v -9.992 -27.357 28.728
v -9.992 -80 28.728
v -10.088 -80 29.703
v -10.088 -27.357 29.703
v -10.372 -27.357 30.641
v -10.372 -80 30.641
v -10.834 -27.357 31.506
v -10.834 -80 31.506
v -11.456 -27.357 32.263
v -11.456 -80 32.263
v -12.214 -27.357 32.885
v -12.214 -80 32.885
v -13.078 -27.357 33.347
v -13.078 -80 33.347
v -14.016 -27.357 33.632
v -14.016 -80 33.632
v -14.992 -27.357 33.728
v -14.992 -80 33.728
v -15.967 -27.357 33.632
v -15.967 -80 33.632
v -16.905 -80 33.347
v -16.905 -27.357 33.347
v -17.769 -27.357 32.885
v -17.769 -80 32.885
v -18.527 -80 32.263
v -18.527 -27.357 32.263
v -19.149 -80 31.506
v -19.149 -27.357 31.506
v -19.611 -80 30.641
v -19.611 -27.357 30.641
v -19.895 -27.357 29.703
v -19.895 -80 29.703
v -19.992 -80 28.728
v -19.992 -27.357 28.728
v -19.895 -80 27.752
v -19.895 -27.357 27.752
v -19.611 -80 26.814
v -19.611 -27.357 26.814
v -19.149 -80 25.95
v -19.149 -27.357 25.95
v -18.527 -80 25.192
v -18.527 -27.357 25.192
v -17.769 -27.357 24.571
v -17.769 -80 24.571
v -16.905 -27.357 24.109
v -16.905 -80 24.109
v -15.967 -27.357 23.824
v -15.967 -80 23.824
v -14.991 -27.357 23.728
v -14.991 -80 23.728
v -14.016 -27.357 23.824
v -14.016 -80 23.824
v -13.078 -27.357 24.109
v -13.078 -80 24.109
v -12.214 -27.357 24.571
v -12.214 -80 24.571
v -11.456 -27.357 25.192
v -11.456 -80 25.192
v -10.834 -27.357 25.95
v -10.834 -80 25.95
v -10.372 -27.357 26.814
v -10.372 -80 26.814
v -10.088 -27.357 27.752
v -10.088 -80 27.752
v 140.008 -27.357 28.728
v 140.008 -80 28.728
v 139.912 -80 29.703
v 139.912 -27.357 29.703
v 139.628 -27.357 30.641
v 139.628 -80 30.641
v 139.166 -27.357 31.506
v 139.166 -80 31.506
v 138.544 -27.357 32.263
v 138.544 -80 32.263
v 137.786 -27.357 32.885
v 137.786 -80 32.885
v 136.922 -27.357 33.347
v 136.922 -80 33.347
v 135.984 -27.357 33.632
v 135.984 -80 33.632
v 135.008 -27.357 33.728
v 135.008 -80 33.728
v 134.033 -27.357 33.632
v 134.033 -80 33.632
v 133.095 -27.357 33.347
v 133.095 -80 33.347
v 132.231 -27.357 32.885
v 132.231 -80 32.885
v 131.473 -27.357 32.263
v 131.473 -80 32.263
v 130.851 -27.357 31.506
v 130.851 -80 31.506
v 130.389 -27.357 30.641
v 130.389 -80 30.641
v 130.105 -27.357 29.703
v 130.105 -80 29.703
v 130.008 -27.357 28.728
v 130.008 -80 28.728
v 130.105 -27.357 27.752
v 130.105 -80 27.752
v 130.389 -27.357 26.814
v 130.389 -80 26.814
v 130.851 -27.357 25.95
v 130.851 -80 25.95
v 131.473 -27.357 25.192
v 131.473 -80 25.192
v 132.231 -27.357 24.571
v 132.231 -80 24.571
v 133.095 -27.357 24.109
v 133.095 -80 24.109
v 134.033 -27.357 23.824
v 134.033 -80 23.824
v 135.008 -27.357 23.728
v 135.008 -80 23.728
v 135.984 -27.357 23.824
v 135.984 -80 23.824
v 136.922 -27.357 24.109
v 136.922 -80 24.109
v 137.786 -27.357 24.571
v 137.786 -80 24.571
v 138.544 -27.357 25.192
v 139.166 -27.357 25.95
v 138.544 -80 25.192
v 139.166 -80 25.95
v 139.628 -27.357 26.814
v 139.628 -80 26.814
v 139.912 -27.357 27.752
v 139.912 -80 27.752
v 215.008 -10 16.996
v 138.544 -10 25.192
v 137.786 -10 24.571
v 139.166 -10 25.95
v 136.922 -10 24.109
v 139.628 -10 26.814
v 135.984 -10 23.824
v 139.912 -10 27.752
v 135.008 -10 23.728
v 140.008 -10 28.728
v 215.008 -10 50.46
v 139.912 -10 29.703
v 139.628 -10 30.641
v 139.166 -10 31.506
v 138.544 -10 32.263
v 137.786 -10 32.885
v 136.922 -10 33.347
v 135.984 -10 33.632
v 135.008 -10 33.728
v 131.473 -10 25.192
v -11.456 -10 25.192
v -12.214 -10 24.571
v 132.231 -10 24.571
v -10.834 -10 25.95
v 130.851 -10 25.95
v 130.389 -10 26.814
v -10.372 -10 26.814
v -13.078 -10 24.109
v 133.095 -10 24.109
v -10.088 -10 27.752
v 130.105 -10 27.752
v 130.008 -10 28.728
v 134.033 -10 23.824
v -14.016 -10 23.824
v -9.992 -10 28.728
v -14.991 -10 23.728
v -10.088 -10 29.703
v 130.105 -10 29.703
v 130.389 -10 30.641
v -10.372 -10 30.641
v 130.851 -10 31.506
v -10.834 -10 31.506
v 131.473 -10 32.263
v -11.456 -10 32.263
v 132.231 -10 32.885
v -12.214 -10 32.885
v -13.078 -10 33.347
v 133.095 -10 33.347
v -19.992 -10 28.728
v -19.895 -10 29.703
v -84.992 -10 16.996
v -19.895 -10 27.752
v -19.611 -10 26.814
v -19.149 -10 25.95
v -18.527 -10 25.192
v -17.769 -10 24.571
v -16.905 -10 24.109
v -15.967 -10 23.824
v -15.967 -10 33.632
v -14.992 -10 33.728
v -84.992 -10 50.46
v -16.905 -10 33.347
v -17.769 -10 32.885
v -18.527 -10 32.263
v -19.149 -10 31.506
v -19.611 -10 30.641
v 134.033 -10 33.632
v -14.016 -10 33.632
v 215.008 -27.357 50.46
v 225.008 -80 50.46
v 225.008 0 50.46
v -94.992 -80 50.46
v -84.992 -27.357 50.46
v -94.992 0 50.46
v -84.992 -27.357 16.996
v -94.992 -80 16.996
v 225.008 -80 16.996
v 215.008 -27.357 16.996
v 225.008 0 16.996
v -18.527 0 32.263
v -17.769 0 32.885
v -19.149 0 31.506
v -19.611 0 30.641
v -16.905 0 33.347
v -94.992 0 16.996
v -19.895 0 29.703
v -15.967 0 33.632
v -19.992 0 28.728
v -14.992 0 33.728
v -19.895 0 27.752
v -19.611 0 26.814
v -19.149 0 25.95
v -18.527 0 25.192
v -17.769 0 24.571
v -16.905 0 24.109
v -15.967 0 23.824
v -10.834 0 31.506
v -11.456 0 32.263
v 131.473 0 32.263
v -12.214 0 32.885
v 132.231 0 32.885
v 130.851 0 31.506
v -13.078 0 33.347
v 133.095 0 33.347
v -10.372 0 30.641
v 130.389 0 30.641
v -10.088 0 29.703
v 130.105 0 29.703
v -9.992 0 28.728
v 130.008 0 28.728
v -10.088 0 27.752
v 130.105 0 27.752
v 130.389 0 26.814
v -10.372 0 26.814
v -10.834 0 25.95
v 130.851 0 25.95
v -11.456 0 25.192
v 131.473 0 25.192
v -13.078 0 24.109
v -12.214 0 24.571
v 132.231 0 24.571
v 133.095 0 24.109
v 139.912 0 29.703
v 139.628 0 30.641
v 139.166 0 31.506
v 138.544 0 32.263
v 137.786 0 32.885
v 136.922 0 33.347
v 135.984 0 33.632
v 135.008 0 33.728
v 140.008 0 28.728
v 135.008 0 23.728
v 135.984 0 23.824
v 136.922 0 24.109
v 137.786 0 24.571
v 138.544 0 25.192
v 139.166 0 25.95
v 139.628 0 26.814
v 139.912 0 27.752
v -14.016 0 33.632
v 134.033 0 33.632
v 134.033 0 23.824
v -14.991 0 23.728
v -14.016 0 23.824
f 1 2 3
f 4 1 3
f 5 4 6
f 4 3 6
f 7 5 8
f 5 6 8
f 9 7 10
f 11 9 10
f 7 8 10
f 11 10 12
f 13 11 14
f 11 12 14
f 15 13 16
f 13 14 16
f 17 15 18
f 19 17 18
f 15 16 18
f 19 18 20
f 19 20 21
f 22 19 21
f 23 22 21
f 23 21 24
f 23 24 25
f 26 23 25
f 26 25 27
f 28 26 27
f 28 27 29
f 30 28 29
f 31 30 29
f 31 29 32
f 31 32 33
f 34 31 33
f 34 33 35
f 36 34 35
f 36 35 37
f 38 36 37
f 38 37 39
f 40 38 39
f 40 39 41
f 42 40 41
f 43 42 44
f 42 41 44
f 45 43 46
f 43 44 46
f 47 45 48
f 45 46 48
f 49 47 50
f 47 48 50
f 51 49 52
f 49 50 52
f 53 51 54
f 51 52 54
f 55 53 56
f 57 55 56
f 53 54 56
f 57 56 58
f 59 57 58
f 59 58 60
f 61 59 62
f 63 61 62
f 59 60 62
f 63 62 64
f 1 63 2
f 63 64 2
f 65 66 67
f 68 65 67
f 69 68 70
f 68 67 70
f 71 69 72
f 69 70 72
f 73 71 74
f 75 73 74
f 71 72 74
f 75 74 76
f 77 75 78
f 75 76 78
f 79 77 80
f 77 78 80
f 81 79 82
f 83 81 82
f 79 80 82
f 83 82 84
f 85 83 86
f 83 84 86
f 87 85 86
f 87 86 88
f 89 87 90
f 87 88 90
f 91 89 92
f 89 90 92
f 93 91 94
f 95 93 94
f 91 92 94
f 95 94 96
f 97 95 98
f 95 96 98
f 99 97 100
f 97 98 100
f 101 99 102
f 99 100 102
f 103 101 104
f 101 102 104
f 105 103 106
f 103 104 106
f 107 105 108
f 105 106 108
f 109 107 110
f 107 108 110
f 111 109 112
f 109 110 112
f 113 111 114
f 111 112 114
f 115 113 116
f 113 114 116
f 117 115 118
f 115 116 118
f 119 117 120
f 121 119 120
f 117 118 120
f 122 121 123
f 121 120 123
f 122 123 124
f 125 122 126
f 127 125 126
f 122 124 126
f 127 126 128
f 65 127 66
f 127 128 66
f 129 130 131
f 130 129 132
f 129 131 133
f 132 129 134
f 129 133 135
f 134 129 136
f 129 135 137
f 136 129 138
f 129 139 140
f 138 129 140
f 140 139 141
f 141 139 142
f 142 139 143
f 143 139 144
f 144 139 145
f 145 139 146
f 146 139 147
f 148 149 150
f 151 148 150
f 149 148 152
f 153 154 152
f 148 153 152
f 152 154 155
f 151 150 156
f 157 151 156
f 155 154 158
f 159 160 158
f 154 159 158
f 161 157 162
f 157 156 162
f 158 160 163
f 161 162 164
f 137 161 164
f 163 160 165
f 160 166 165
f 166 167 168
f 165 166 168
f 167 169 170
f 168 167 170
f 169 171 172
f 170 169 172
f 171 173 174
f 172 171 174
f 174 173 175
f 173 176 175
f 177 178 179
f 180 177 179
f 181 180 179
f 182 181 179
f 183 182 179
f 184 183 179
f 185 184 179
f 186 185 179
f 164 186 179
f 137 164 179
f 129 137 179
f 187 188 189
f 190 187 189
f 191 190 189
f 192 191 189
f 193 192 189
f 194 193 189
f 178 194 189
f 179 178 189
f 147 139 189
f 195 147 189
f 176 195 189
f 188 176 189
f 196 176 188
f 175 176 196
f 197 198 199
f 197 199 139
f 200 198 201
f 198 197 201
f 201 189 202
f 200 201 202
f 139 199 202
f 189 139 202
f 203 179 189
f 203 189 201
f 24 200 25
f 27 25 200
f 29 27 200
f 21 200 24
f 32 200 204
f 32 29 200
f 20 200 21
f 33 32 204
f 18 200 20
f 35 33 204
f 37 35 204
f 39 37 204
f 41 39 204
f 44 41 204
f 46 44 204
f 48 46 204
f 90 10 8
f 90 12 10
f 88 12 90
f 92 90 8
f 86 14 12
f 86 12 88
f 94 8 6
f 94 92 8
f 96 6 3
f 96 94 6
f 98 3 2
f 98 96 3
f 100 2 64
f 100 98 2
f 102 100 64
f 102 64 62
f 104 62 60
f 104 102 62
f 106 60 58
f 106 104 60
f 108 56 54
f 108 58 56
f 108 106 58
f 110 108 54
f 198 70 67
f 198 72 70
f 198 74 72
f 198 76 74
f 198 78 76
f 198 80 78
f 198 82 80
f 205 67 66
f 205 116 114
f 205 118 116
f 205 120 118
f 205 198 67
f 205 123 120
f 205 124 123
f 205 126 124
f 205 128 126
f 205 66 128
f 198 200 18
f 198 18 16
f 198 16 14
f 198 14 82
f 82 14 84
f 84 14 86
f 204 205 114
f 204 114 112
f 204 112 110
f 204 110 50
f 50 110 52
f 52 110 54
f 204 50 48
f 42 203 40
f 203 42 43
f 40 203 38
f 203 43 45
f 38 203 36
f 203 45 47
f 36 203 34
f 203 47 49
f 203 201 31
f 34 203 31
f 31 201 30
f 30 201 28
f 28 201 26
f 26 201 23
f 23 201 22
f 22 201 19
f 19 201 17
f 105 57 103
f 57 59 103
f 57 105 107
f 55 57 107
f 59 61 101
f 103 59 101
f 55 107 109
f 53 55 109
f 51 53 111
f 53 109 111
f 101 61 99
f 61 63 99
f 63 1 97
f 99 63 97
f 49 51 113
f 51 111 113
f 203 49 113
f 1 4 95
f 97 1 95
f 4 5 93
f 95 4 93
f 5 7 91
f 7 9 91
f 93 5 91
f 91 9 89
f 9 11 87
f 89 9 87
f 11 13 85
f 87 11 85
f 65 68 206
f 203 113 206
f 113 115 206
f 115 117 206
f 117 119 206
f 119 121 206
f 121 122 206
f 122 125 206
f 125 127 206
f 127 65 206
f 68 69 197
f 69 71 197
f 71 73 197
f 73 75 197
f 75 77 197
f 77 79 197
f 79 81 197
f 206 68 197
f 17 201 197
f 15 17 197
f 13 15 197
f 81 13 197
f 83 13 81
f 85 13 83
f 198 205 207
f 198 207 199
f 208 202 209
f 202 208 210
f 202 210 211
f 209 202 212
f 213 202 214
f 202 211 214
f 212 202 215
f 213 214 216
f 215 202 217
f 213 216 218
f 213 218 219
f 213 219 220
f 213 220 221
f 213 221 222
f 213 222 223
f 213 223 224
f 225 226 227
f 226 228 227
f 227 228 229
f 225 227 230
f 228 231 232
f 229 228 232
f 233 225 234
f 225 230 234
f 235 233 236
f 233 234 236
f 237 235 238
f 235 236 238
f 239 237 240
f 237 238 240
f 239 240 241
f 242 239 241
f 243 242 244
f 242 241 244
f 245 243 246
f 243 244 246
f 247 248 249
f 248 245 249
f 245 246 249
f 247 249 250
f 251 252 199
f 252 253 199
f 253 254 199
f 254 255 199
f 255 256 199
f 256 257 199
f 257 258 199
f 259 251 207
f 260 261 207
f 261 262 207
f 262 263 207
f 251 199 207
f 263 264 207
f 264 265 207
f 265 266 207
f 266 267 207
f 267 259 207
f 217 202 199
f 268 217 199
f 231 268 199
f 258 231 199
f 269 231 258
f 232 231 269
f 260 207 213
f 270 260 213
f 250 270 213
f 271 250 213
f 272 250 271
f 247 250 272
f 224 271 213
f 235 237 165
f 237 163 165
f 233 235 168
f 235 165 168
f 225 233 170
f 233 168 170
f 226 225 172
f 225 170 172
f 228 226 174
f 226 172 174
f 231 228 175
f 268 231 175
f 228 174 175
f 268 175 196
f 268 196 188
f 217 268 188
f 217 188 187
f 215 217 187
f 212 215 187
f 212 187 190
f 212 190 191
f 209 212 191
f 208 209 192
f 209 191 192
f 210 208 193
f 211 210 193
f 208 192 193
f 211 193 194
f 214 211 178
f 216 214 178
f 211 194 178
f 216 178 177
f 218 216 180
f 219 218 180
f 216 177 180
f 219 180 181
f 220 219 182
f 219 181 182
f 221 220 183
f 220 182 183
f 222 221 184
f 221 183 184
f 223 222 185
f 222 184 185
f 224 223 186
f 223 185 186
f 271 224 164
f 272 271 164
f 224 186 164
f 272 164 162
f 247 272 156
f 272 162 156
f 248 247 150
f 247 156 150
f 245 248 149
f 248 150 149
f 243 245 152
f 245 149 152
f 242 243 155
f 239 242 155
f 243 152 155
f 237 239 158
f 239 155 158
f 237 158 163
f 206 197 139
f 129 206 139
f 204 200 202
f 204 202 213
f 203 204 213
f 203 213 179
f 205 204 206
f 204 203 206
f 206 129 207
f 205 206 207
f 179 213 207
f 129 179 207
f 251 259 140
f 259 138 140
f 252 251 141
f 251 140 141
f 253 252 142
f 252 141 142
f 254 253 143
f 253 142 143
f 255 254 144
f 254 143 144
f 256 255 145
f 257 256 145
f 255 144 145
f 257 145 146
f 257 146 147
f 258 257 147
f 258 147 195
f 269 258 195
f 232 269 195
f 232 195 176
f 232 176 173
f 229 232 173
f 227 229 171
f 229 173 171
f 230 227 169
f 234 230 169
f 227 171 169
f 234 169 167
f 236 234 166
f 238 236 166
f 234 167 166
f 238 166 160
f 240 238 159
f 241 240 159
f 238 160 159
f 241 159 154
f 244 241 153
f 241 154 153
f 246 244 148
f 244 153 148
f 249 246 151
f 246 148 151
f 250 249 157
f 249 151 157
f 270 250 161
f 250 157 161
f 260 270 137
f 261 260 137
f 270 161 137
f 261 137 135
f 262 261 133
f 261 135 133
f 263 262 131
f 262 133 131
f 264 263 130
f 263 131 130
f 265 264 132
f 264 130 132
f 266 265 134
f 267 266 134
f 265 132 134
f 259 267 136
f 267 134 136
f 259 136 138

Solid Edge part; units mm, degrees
sketch "Sketch1" plane through (0, 0, 0) normal (0, -1, 0) x (1, 0, 0)
  line L0 (-94.9915, 16.9957) -> (225.0085, 16.9957)
  line L1 (225.0085, 16.9957) -> (225.0085, 50.4601)
  line L2 (225.0085, 50.4601) -> (-94.9915, 50.4601)
  line L3 (-94.9915, 50.4601) -> (-94.9915, 16.9957)
  dimension "D1" = 320
  dimension "D2" = 33.4644
extrude "Protrusion1" add sketch "Sketch1" along normal blind 80
sketch "Sketch2" plane through (55.0085, -15, 50.4601) normal (0, 0, 1) x (1, 0, 0)
  line L0 (-140, -12.3571) -> (160, -12.3571)
  line L1 (160, -12.3571) -> (160, 5)
  line L2 (160, 5) -> (-140, 5)
  line L3 (-140, 5) -> (-140, -12.3571)
  dimension "D1" = 300
  dimension "D2" = 17.3571
  dimension "D3" = 10
extrude "Cutout1" cut sketch "Sketch2" against normal through all
sketch "Sketch3" plane through (65.0085, -80, 33.7279) normal (0, -1, 0) x (1, 0, 0)
  circle A0 centre (70, -5) radius 5
  circle A1 centre (-80, -5) radius 5
  dimension "D1" = 10
  dimension "D2" = 10
  dimension "D3" = 150
  dimension "D4" = 80
  dimension "D5" = 5
extrude "Cutout2" cut sketch "Sketch3" against normal through all
